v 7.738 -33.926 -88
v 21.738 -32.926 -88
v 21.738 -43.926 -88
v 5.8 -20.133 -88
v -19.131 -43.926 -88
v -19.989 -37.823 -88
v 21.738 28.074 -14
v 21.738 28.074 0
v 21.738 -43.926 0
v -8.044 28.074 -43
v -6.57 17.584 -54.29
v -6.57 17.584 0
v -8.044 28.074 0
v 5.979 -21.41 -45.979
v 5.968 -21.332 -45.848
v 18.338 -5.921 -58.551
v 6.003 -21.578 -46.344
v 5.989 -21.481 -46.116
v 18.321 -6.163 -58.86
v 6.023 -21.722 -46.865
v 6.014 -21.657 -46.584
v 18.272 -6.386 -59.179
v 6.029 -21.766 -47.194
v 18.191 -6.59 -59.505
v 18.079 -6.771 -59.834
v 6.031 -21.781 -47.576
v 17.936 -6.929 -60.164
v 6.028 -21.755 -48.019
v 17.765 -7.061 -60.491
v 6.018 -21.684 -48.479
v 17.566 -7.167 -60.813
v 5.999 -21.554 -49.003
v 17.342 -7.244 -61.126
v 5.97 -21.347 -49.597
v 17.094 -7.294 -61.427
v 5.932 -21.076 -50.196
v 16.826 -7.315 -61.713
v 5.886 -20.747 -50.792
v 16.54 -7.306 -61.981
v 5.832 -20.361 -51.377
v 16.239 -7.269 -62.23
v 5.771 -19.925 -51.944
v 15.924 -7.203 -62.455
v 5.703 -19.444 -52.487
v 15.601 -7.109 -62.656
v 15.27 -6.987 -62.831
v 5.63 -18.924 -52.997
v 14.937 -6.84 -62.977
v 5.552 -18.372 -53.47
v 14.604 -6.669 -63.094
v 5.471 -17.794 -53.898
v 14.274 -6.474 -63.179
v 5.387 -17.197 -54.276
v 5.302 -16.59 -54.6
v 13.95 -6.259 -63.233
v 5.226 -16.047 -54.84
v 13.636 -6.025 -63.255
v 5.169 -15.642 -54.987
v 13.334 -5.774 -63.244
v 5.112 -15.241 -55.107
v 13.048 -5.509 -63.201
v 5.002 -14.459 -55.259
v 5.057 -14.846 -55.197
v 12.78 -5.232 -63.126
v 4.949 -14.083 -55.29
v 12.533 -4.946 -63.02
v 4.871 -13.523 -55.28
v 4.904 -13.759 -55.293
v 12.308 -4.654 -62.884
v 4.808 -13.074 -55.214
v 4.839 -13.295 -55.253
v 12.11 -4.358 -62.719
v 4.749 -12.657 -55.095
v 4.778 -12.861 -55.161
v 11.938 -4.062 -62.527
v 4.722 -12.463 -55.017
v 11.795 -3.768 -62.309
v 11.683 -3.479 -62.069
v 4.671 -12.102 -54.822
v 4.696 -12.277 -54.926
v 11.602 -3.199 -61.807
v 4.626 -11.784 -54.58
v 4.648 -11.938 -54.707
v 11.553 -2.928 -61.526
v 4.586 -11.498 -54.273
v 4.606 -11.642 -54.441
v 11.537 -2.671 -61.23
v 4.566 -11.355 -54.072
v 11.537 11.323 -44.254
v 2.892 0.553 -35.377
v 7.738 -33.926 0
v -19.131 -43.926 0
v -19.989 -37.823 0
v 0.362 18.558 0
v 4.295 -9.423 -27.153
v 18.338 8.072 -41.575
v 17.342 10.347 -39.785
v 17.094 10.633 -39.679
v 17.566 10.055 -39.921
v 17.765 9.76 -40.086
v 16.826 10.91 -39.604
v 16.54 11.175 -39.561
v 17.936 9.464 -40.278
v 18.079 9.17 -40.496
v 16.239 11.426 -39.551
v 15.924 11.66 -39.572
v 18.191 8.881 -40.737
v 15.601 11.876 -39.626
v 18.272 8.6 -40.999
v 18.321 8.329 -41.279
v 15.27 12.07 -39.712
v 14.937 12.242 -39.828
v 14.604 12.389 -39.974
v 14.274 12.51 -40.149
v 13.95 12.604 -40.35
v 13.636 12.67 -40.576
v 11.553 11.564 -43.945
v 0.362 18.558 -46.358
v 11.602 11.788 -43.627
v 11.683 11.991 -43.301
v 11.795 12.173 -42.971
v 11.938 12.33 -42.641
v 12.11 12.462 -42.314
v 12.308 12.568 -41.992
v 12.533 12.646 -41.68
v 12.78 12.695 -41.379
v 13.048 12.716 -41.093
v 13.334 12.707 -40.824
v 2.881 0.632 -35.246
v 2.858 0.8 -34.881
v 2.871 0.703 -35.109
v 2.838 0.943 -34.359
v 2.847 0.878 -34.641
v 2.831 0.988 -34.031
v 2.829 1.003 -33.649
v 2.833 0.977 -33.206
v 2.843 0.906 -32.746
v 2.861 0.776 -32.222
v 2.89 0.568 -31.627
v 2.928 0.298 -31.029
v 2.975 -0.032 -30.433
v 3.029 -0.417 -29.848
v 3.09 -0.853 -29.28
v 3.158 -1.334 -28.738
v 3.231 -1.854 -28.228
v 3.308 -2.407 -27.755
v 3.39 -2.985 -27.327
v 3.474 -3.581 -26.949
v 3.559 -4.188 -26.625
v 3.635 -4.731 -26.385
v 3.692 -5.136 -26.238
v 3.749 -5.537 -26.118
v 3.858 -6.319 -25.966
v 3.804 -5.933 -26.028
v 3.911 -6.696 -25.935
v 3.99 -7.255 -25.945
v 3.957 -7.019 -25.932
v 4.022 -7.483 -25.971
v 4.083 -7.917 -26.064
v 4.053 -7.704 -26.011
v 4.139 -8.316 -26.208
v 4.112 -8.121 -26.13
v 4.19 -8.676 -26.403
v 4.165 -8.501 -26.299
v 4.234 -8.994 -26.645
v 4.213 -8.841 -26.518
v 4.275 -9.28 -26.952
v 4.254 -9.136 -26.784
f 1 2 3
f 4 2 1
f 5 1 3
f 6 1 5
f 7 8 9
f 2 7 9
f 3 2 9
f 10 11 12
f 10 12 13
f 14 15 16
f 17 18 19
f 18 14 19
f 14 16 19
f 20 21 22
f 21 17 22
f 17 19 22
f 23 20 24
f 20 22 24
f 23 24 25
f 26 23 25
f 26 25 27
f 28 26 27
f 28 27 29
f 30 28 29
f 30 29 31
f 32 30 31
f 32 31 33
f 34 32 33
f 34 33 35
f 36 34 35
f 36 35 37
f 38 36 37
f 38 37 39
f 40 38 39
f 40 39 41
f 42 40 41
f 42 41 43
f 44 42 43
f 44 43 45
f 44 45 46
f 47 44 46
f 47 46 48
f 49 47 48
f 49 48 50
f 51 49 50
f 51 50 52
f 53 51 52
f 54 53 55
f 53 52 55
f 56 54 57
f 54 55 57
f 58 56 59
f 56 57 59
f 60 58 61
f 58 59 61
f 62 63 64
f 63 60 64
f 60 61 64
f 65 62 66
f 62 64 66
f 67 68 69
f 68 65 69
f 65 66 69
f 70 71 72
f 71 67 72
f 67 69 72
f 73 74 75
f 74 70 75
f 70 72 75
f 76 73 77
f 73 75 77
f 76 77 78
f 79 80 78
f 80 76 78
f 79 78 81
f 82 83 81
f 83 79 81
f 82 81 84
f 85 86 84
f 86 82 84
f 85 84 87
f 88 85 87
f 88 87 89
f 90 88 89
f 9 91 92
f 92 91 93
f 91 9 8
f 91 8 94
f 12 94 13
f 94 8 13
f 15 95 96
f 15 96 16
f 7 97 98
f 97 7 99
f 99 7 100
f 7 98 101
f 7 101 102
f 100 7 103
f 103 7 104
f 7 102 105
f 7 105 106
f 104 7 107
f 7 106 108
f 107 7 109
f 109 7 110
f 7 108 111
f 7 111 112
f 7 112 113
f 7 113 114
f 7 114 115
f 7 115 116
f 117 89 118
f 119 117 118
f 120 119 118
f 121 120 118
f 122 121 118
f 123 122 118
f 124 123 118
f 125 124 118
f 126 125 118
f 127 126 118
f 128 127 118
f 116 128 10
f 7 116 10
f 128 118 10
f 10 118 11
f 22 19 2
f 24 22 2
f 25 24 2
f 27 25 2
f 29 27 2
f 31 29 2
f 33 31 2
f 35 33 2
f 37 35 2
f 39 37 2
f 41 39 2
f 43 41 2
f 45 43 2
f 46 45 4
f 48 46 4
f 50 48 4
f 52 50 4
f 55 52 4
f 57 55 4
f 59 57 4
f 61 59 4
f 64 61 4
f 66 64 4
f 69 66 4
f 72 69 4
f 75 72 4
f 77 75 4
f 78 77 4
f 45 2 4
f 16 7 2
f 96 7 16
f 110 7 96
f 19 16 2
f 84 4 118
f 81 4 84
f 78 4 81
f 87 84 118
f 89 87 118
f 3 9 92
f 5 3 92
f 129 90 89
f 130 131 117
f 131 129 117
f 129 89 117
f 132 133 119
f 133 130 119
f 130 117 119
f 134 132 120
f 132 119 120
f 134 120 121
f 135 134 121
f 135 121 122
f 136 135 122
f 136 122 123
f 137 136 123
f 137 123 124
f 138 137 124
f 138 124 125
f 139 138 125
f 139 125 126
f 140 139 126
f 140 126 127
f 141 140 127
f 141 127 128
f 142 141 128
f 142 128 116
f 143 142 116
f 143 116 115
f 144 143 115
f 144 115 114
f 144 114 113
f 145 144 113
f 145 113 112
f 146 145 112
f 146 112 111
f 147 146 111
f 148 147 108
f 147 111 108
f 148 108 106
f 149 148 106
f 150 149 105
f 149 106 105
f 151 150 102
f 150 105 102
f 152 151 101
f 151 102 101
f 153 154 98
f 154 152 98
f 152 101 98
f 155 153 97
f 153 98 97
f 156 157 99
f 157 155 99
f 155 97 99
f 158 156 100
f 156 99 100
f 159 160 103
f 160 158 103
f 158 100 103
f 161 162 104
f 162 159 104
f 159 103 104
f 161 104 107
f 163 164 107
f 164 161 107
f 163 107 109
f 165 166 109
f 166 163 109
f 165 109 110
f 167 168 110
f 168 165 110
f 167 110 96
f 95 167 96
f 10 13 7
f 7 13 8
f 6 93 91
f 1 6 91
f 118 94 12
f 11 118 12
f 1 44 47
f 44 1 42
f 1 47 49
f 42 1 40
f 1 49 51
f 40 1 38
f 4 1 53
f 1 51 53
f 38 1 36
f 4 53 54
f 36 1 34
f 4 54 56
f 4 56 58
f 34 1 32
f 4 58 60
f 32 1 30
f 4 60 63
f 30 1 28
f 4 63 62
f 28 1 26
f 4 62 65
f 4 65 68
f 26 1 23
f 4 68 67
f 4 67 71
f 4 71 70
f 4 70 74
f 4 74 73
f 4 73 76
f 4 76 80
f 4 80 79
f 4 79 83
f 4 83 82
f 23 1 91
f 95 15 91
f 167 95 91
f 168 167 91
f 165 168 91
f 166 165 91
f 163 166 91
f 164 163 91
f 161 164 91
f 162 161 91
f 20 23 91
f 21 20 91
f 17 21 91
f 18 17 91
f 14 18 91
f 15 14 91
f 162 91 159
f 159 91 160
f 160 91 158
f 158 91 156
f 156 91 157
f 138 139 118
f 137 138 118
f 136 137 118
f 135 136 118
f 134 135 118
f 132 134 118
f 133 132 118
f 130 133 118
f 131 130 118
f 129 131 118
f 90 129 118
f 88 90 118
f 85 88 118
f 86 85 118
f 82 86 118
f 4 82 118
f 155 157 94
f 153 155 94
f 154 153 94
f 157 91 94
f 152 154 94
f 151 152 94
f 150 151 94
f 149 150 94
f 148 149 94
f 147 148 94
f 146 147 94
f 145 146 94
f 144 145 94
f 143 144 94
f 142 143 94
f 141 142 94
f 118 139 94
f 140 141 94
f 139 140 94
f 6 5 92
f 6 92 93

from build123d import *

# Parameters (mm, degrees)
BOSS_EXTRUDE1_DEPTH = 88
SKETCH5_W           = 120.314234724
SKETCH5_H           = 205.924557391
CUT_EXTRUDE1_DEPTH  = 88
CUT_EXTRUDE2_REACH  = 78.774


with BuildPart() as part:
    # Sketch2 → Boss-Extrude1 (new body)
    with BuildSketch(Plane.XY):
        Polygon((21.738330866, 28.073521819), (21.738330866, -43.926478181), (-19.131432817, -43.926478181), (-19.989175059, -37.823325008), (7.738330866, -33.926478181), (0.362156515, 18.557729462), (-6.569719966, 17.583517755), (-8.043993893, 28.073521819), align=None)
    extrude(amount=-BOSS_EXTRUDE1_DEPTH)

    # Sketch5 → Cut-Extrude1 (cut)
    with BuildSketch(Plane(origin=(19.710307893, 24.555901932, -20.242027268), x_dir=(-0.850144649, 0.406300724, -0.33492357), z_dir=(-0.526549216, -0.655996394, 0.540753784))):
        with Locations((18.13624664, 41.178747918)):
            Rectangle(SKETCH5_W, SKETCH5_H)
    extrude(amount=-CUT_EXTRUDE1_DEPTH, mode=Mode.SUBTRACT)

    # Cut-Extrude2: up to this face of the body (flat: up to its plane)
    cut_extrude2_end = Plane(part.part.faces().sort_by_distance((4.446485826, -10.503783654, -37.636714234))[0])
    # Sketch6 → Cut-Extrude2 (cut, up to the picked face)
    with BuildSketch(Plane(origin=(19.710307893, 24.555901932, -20.242027268), x_dir=(0.850144649, -0.406300724, 0.33492357), z_dir=(0.526549216, 0.655996394, -0.540753784)), mode=Mode.PRIVATE) as cut_extrude2_sk1:
        with BuildLine():
            Line((-1.614496573, 26.946007892), (-1.614496573, 48.946007892))
            ThreePointArc((-1.614496573, 48.946007892), (-5.614496573, 52.946007892), (-9.614496573, 48.946007892))
            Line((-9.614496573, 48.946007892), (-9.614496573, 26.946007892))
            ThreePointArc((-9.614496573, 26.946007892), (-5.614496573, 22.946007892), (-1.614496573, 26.946007892))
        make_face()
    cut_extrude2_tool1 = split(extrude(cut_extrude2_sk1.sketch, amount=-CUT_EXTRUDE2_REACH, mode=Mode.PRIVATE), bisect_by=cut_extrude2_end, keep=Keep.BOTH, mode=Mode.PRIVATE)
    add(cut_extrude2_tool1.solids().sort_by_distance((14.937174, 2.700657, -51.4027))[0], mode=Mode.SUBTRACT)


solid = part.part
